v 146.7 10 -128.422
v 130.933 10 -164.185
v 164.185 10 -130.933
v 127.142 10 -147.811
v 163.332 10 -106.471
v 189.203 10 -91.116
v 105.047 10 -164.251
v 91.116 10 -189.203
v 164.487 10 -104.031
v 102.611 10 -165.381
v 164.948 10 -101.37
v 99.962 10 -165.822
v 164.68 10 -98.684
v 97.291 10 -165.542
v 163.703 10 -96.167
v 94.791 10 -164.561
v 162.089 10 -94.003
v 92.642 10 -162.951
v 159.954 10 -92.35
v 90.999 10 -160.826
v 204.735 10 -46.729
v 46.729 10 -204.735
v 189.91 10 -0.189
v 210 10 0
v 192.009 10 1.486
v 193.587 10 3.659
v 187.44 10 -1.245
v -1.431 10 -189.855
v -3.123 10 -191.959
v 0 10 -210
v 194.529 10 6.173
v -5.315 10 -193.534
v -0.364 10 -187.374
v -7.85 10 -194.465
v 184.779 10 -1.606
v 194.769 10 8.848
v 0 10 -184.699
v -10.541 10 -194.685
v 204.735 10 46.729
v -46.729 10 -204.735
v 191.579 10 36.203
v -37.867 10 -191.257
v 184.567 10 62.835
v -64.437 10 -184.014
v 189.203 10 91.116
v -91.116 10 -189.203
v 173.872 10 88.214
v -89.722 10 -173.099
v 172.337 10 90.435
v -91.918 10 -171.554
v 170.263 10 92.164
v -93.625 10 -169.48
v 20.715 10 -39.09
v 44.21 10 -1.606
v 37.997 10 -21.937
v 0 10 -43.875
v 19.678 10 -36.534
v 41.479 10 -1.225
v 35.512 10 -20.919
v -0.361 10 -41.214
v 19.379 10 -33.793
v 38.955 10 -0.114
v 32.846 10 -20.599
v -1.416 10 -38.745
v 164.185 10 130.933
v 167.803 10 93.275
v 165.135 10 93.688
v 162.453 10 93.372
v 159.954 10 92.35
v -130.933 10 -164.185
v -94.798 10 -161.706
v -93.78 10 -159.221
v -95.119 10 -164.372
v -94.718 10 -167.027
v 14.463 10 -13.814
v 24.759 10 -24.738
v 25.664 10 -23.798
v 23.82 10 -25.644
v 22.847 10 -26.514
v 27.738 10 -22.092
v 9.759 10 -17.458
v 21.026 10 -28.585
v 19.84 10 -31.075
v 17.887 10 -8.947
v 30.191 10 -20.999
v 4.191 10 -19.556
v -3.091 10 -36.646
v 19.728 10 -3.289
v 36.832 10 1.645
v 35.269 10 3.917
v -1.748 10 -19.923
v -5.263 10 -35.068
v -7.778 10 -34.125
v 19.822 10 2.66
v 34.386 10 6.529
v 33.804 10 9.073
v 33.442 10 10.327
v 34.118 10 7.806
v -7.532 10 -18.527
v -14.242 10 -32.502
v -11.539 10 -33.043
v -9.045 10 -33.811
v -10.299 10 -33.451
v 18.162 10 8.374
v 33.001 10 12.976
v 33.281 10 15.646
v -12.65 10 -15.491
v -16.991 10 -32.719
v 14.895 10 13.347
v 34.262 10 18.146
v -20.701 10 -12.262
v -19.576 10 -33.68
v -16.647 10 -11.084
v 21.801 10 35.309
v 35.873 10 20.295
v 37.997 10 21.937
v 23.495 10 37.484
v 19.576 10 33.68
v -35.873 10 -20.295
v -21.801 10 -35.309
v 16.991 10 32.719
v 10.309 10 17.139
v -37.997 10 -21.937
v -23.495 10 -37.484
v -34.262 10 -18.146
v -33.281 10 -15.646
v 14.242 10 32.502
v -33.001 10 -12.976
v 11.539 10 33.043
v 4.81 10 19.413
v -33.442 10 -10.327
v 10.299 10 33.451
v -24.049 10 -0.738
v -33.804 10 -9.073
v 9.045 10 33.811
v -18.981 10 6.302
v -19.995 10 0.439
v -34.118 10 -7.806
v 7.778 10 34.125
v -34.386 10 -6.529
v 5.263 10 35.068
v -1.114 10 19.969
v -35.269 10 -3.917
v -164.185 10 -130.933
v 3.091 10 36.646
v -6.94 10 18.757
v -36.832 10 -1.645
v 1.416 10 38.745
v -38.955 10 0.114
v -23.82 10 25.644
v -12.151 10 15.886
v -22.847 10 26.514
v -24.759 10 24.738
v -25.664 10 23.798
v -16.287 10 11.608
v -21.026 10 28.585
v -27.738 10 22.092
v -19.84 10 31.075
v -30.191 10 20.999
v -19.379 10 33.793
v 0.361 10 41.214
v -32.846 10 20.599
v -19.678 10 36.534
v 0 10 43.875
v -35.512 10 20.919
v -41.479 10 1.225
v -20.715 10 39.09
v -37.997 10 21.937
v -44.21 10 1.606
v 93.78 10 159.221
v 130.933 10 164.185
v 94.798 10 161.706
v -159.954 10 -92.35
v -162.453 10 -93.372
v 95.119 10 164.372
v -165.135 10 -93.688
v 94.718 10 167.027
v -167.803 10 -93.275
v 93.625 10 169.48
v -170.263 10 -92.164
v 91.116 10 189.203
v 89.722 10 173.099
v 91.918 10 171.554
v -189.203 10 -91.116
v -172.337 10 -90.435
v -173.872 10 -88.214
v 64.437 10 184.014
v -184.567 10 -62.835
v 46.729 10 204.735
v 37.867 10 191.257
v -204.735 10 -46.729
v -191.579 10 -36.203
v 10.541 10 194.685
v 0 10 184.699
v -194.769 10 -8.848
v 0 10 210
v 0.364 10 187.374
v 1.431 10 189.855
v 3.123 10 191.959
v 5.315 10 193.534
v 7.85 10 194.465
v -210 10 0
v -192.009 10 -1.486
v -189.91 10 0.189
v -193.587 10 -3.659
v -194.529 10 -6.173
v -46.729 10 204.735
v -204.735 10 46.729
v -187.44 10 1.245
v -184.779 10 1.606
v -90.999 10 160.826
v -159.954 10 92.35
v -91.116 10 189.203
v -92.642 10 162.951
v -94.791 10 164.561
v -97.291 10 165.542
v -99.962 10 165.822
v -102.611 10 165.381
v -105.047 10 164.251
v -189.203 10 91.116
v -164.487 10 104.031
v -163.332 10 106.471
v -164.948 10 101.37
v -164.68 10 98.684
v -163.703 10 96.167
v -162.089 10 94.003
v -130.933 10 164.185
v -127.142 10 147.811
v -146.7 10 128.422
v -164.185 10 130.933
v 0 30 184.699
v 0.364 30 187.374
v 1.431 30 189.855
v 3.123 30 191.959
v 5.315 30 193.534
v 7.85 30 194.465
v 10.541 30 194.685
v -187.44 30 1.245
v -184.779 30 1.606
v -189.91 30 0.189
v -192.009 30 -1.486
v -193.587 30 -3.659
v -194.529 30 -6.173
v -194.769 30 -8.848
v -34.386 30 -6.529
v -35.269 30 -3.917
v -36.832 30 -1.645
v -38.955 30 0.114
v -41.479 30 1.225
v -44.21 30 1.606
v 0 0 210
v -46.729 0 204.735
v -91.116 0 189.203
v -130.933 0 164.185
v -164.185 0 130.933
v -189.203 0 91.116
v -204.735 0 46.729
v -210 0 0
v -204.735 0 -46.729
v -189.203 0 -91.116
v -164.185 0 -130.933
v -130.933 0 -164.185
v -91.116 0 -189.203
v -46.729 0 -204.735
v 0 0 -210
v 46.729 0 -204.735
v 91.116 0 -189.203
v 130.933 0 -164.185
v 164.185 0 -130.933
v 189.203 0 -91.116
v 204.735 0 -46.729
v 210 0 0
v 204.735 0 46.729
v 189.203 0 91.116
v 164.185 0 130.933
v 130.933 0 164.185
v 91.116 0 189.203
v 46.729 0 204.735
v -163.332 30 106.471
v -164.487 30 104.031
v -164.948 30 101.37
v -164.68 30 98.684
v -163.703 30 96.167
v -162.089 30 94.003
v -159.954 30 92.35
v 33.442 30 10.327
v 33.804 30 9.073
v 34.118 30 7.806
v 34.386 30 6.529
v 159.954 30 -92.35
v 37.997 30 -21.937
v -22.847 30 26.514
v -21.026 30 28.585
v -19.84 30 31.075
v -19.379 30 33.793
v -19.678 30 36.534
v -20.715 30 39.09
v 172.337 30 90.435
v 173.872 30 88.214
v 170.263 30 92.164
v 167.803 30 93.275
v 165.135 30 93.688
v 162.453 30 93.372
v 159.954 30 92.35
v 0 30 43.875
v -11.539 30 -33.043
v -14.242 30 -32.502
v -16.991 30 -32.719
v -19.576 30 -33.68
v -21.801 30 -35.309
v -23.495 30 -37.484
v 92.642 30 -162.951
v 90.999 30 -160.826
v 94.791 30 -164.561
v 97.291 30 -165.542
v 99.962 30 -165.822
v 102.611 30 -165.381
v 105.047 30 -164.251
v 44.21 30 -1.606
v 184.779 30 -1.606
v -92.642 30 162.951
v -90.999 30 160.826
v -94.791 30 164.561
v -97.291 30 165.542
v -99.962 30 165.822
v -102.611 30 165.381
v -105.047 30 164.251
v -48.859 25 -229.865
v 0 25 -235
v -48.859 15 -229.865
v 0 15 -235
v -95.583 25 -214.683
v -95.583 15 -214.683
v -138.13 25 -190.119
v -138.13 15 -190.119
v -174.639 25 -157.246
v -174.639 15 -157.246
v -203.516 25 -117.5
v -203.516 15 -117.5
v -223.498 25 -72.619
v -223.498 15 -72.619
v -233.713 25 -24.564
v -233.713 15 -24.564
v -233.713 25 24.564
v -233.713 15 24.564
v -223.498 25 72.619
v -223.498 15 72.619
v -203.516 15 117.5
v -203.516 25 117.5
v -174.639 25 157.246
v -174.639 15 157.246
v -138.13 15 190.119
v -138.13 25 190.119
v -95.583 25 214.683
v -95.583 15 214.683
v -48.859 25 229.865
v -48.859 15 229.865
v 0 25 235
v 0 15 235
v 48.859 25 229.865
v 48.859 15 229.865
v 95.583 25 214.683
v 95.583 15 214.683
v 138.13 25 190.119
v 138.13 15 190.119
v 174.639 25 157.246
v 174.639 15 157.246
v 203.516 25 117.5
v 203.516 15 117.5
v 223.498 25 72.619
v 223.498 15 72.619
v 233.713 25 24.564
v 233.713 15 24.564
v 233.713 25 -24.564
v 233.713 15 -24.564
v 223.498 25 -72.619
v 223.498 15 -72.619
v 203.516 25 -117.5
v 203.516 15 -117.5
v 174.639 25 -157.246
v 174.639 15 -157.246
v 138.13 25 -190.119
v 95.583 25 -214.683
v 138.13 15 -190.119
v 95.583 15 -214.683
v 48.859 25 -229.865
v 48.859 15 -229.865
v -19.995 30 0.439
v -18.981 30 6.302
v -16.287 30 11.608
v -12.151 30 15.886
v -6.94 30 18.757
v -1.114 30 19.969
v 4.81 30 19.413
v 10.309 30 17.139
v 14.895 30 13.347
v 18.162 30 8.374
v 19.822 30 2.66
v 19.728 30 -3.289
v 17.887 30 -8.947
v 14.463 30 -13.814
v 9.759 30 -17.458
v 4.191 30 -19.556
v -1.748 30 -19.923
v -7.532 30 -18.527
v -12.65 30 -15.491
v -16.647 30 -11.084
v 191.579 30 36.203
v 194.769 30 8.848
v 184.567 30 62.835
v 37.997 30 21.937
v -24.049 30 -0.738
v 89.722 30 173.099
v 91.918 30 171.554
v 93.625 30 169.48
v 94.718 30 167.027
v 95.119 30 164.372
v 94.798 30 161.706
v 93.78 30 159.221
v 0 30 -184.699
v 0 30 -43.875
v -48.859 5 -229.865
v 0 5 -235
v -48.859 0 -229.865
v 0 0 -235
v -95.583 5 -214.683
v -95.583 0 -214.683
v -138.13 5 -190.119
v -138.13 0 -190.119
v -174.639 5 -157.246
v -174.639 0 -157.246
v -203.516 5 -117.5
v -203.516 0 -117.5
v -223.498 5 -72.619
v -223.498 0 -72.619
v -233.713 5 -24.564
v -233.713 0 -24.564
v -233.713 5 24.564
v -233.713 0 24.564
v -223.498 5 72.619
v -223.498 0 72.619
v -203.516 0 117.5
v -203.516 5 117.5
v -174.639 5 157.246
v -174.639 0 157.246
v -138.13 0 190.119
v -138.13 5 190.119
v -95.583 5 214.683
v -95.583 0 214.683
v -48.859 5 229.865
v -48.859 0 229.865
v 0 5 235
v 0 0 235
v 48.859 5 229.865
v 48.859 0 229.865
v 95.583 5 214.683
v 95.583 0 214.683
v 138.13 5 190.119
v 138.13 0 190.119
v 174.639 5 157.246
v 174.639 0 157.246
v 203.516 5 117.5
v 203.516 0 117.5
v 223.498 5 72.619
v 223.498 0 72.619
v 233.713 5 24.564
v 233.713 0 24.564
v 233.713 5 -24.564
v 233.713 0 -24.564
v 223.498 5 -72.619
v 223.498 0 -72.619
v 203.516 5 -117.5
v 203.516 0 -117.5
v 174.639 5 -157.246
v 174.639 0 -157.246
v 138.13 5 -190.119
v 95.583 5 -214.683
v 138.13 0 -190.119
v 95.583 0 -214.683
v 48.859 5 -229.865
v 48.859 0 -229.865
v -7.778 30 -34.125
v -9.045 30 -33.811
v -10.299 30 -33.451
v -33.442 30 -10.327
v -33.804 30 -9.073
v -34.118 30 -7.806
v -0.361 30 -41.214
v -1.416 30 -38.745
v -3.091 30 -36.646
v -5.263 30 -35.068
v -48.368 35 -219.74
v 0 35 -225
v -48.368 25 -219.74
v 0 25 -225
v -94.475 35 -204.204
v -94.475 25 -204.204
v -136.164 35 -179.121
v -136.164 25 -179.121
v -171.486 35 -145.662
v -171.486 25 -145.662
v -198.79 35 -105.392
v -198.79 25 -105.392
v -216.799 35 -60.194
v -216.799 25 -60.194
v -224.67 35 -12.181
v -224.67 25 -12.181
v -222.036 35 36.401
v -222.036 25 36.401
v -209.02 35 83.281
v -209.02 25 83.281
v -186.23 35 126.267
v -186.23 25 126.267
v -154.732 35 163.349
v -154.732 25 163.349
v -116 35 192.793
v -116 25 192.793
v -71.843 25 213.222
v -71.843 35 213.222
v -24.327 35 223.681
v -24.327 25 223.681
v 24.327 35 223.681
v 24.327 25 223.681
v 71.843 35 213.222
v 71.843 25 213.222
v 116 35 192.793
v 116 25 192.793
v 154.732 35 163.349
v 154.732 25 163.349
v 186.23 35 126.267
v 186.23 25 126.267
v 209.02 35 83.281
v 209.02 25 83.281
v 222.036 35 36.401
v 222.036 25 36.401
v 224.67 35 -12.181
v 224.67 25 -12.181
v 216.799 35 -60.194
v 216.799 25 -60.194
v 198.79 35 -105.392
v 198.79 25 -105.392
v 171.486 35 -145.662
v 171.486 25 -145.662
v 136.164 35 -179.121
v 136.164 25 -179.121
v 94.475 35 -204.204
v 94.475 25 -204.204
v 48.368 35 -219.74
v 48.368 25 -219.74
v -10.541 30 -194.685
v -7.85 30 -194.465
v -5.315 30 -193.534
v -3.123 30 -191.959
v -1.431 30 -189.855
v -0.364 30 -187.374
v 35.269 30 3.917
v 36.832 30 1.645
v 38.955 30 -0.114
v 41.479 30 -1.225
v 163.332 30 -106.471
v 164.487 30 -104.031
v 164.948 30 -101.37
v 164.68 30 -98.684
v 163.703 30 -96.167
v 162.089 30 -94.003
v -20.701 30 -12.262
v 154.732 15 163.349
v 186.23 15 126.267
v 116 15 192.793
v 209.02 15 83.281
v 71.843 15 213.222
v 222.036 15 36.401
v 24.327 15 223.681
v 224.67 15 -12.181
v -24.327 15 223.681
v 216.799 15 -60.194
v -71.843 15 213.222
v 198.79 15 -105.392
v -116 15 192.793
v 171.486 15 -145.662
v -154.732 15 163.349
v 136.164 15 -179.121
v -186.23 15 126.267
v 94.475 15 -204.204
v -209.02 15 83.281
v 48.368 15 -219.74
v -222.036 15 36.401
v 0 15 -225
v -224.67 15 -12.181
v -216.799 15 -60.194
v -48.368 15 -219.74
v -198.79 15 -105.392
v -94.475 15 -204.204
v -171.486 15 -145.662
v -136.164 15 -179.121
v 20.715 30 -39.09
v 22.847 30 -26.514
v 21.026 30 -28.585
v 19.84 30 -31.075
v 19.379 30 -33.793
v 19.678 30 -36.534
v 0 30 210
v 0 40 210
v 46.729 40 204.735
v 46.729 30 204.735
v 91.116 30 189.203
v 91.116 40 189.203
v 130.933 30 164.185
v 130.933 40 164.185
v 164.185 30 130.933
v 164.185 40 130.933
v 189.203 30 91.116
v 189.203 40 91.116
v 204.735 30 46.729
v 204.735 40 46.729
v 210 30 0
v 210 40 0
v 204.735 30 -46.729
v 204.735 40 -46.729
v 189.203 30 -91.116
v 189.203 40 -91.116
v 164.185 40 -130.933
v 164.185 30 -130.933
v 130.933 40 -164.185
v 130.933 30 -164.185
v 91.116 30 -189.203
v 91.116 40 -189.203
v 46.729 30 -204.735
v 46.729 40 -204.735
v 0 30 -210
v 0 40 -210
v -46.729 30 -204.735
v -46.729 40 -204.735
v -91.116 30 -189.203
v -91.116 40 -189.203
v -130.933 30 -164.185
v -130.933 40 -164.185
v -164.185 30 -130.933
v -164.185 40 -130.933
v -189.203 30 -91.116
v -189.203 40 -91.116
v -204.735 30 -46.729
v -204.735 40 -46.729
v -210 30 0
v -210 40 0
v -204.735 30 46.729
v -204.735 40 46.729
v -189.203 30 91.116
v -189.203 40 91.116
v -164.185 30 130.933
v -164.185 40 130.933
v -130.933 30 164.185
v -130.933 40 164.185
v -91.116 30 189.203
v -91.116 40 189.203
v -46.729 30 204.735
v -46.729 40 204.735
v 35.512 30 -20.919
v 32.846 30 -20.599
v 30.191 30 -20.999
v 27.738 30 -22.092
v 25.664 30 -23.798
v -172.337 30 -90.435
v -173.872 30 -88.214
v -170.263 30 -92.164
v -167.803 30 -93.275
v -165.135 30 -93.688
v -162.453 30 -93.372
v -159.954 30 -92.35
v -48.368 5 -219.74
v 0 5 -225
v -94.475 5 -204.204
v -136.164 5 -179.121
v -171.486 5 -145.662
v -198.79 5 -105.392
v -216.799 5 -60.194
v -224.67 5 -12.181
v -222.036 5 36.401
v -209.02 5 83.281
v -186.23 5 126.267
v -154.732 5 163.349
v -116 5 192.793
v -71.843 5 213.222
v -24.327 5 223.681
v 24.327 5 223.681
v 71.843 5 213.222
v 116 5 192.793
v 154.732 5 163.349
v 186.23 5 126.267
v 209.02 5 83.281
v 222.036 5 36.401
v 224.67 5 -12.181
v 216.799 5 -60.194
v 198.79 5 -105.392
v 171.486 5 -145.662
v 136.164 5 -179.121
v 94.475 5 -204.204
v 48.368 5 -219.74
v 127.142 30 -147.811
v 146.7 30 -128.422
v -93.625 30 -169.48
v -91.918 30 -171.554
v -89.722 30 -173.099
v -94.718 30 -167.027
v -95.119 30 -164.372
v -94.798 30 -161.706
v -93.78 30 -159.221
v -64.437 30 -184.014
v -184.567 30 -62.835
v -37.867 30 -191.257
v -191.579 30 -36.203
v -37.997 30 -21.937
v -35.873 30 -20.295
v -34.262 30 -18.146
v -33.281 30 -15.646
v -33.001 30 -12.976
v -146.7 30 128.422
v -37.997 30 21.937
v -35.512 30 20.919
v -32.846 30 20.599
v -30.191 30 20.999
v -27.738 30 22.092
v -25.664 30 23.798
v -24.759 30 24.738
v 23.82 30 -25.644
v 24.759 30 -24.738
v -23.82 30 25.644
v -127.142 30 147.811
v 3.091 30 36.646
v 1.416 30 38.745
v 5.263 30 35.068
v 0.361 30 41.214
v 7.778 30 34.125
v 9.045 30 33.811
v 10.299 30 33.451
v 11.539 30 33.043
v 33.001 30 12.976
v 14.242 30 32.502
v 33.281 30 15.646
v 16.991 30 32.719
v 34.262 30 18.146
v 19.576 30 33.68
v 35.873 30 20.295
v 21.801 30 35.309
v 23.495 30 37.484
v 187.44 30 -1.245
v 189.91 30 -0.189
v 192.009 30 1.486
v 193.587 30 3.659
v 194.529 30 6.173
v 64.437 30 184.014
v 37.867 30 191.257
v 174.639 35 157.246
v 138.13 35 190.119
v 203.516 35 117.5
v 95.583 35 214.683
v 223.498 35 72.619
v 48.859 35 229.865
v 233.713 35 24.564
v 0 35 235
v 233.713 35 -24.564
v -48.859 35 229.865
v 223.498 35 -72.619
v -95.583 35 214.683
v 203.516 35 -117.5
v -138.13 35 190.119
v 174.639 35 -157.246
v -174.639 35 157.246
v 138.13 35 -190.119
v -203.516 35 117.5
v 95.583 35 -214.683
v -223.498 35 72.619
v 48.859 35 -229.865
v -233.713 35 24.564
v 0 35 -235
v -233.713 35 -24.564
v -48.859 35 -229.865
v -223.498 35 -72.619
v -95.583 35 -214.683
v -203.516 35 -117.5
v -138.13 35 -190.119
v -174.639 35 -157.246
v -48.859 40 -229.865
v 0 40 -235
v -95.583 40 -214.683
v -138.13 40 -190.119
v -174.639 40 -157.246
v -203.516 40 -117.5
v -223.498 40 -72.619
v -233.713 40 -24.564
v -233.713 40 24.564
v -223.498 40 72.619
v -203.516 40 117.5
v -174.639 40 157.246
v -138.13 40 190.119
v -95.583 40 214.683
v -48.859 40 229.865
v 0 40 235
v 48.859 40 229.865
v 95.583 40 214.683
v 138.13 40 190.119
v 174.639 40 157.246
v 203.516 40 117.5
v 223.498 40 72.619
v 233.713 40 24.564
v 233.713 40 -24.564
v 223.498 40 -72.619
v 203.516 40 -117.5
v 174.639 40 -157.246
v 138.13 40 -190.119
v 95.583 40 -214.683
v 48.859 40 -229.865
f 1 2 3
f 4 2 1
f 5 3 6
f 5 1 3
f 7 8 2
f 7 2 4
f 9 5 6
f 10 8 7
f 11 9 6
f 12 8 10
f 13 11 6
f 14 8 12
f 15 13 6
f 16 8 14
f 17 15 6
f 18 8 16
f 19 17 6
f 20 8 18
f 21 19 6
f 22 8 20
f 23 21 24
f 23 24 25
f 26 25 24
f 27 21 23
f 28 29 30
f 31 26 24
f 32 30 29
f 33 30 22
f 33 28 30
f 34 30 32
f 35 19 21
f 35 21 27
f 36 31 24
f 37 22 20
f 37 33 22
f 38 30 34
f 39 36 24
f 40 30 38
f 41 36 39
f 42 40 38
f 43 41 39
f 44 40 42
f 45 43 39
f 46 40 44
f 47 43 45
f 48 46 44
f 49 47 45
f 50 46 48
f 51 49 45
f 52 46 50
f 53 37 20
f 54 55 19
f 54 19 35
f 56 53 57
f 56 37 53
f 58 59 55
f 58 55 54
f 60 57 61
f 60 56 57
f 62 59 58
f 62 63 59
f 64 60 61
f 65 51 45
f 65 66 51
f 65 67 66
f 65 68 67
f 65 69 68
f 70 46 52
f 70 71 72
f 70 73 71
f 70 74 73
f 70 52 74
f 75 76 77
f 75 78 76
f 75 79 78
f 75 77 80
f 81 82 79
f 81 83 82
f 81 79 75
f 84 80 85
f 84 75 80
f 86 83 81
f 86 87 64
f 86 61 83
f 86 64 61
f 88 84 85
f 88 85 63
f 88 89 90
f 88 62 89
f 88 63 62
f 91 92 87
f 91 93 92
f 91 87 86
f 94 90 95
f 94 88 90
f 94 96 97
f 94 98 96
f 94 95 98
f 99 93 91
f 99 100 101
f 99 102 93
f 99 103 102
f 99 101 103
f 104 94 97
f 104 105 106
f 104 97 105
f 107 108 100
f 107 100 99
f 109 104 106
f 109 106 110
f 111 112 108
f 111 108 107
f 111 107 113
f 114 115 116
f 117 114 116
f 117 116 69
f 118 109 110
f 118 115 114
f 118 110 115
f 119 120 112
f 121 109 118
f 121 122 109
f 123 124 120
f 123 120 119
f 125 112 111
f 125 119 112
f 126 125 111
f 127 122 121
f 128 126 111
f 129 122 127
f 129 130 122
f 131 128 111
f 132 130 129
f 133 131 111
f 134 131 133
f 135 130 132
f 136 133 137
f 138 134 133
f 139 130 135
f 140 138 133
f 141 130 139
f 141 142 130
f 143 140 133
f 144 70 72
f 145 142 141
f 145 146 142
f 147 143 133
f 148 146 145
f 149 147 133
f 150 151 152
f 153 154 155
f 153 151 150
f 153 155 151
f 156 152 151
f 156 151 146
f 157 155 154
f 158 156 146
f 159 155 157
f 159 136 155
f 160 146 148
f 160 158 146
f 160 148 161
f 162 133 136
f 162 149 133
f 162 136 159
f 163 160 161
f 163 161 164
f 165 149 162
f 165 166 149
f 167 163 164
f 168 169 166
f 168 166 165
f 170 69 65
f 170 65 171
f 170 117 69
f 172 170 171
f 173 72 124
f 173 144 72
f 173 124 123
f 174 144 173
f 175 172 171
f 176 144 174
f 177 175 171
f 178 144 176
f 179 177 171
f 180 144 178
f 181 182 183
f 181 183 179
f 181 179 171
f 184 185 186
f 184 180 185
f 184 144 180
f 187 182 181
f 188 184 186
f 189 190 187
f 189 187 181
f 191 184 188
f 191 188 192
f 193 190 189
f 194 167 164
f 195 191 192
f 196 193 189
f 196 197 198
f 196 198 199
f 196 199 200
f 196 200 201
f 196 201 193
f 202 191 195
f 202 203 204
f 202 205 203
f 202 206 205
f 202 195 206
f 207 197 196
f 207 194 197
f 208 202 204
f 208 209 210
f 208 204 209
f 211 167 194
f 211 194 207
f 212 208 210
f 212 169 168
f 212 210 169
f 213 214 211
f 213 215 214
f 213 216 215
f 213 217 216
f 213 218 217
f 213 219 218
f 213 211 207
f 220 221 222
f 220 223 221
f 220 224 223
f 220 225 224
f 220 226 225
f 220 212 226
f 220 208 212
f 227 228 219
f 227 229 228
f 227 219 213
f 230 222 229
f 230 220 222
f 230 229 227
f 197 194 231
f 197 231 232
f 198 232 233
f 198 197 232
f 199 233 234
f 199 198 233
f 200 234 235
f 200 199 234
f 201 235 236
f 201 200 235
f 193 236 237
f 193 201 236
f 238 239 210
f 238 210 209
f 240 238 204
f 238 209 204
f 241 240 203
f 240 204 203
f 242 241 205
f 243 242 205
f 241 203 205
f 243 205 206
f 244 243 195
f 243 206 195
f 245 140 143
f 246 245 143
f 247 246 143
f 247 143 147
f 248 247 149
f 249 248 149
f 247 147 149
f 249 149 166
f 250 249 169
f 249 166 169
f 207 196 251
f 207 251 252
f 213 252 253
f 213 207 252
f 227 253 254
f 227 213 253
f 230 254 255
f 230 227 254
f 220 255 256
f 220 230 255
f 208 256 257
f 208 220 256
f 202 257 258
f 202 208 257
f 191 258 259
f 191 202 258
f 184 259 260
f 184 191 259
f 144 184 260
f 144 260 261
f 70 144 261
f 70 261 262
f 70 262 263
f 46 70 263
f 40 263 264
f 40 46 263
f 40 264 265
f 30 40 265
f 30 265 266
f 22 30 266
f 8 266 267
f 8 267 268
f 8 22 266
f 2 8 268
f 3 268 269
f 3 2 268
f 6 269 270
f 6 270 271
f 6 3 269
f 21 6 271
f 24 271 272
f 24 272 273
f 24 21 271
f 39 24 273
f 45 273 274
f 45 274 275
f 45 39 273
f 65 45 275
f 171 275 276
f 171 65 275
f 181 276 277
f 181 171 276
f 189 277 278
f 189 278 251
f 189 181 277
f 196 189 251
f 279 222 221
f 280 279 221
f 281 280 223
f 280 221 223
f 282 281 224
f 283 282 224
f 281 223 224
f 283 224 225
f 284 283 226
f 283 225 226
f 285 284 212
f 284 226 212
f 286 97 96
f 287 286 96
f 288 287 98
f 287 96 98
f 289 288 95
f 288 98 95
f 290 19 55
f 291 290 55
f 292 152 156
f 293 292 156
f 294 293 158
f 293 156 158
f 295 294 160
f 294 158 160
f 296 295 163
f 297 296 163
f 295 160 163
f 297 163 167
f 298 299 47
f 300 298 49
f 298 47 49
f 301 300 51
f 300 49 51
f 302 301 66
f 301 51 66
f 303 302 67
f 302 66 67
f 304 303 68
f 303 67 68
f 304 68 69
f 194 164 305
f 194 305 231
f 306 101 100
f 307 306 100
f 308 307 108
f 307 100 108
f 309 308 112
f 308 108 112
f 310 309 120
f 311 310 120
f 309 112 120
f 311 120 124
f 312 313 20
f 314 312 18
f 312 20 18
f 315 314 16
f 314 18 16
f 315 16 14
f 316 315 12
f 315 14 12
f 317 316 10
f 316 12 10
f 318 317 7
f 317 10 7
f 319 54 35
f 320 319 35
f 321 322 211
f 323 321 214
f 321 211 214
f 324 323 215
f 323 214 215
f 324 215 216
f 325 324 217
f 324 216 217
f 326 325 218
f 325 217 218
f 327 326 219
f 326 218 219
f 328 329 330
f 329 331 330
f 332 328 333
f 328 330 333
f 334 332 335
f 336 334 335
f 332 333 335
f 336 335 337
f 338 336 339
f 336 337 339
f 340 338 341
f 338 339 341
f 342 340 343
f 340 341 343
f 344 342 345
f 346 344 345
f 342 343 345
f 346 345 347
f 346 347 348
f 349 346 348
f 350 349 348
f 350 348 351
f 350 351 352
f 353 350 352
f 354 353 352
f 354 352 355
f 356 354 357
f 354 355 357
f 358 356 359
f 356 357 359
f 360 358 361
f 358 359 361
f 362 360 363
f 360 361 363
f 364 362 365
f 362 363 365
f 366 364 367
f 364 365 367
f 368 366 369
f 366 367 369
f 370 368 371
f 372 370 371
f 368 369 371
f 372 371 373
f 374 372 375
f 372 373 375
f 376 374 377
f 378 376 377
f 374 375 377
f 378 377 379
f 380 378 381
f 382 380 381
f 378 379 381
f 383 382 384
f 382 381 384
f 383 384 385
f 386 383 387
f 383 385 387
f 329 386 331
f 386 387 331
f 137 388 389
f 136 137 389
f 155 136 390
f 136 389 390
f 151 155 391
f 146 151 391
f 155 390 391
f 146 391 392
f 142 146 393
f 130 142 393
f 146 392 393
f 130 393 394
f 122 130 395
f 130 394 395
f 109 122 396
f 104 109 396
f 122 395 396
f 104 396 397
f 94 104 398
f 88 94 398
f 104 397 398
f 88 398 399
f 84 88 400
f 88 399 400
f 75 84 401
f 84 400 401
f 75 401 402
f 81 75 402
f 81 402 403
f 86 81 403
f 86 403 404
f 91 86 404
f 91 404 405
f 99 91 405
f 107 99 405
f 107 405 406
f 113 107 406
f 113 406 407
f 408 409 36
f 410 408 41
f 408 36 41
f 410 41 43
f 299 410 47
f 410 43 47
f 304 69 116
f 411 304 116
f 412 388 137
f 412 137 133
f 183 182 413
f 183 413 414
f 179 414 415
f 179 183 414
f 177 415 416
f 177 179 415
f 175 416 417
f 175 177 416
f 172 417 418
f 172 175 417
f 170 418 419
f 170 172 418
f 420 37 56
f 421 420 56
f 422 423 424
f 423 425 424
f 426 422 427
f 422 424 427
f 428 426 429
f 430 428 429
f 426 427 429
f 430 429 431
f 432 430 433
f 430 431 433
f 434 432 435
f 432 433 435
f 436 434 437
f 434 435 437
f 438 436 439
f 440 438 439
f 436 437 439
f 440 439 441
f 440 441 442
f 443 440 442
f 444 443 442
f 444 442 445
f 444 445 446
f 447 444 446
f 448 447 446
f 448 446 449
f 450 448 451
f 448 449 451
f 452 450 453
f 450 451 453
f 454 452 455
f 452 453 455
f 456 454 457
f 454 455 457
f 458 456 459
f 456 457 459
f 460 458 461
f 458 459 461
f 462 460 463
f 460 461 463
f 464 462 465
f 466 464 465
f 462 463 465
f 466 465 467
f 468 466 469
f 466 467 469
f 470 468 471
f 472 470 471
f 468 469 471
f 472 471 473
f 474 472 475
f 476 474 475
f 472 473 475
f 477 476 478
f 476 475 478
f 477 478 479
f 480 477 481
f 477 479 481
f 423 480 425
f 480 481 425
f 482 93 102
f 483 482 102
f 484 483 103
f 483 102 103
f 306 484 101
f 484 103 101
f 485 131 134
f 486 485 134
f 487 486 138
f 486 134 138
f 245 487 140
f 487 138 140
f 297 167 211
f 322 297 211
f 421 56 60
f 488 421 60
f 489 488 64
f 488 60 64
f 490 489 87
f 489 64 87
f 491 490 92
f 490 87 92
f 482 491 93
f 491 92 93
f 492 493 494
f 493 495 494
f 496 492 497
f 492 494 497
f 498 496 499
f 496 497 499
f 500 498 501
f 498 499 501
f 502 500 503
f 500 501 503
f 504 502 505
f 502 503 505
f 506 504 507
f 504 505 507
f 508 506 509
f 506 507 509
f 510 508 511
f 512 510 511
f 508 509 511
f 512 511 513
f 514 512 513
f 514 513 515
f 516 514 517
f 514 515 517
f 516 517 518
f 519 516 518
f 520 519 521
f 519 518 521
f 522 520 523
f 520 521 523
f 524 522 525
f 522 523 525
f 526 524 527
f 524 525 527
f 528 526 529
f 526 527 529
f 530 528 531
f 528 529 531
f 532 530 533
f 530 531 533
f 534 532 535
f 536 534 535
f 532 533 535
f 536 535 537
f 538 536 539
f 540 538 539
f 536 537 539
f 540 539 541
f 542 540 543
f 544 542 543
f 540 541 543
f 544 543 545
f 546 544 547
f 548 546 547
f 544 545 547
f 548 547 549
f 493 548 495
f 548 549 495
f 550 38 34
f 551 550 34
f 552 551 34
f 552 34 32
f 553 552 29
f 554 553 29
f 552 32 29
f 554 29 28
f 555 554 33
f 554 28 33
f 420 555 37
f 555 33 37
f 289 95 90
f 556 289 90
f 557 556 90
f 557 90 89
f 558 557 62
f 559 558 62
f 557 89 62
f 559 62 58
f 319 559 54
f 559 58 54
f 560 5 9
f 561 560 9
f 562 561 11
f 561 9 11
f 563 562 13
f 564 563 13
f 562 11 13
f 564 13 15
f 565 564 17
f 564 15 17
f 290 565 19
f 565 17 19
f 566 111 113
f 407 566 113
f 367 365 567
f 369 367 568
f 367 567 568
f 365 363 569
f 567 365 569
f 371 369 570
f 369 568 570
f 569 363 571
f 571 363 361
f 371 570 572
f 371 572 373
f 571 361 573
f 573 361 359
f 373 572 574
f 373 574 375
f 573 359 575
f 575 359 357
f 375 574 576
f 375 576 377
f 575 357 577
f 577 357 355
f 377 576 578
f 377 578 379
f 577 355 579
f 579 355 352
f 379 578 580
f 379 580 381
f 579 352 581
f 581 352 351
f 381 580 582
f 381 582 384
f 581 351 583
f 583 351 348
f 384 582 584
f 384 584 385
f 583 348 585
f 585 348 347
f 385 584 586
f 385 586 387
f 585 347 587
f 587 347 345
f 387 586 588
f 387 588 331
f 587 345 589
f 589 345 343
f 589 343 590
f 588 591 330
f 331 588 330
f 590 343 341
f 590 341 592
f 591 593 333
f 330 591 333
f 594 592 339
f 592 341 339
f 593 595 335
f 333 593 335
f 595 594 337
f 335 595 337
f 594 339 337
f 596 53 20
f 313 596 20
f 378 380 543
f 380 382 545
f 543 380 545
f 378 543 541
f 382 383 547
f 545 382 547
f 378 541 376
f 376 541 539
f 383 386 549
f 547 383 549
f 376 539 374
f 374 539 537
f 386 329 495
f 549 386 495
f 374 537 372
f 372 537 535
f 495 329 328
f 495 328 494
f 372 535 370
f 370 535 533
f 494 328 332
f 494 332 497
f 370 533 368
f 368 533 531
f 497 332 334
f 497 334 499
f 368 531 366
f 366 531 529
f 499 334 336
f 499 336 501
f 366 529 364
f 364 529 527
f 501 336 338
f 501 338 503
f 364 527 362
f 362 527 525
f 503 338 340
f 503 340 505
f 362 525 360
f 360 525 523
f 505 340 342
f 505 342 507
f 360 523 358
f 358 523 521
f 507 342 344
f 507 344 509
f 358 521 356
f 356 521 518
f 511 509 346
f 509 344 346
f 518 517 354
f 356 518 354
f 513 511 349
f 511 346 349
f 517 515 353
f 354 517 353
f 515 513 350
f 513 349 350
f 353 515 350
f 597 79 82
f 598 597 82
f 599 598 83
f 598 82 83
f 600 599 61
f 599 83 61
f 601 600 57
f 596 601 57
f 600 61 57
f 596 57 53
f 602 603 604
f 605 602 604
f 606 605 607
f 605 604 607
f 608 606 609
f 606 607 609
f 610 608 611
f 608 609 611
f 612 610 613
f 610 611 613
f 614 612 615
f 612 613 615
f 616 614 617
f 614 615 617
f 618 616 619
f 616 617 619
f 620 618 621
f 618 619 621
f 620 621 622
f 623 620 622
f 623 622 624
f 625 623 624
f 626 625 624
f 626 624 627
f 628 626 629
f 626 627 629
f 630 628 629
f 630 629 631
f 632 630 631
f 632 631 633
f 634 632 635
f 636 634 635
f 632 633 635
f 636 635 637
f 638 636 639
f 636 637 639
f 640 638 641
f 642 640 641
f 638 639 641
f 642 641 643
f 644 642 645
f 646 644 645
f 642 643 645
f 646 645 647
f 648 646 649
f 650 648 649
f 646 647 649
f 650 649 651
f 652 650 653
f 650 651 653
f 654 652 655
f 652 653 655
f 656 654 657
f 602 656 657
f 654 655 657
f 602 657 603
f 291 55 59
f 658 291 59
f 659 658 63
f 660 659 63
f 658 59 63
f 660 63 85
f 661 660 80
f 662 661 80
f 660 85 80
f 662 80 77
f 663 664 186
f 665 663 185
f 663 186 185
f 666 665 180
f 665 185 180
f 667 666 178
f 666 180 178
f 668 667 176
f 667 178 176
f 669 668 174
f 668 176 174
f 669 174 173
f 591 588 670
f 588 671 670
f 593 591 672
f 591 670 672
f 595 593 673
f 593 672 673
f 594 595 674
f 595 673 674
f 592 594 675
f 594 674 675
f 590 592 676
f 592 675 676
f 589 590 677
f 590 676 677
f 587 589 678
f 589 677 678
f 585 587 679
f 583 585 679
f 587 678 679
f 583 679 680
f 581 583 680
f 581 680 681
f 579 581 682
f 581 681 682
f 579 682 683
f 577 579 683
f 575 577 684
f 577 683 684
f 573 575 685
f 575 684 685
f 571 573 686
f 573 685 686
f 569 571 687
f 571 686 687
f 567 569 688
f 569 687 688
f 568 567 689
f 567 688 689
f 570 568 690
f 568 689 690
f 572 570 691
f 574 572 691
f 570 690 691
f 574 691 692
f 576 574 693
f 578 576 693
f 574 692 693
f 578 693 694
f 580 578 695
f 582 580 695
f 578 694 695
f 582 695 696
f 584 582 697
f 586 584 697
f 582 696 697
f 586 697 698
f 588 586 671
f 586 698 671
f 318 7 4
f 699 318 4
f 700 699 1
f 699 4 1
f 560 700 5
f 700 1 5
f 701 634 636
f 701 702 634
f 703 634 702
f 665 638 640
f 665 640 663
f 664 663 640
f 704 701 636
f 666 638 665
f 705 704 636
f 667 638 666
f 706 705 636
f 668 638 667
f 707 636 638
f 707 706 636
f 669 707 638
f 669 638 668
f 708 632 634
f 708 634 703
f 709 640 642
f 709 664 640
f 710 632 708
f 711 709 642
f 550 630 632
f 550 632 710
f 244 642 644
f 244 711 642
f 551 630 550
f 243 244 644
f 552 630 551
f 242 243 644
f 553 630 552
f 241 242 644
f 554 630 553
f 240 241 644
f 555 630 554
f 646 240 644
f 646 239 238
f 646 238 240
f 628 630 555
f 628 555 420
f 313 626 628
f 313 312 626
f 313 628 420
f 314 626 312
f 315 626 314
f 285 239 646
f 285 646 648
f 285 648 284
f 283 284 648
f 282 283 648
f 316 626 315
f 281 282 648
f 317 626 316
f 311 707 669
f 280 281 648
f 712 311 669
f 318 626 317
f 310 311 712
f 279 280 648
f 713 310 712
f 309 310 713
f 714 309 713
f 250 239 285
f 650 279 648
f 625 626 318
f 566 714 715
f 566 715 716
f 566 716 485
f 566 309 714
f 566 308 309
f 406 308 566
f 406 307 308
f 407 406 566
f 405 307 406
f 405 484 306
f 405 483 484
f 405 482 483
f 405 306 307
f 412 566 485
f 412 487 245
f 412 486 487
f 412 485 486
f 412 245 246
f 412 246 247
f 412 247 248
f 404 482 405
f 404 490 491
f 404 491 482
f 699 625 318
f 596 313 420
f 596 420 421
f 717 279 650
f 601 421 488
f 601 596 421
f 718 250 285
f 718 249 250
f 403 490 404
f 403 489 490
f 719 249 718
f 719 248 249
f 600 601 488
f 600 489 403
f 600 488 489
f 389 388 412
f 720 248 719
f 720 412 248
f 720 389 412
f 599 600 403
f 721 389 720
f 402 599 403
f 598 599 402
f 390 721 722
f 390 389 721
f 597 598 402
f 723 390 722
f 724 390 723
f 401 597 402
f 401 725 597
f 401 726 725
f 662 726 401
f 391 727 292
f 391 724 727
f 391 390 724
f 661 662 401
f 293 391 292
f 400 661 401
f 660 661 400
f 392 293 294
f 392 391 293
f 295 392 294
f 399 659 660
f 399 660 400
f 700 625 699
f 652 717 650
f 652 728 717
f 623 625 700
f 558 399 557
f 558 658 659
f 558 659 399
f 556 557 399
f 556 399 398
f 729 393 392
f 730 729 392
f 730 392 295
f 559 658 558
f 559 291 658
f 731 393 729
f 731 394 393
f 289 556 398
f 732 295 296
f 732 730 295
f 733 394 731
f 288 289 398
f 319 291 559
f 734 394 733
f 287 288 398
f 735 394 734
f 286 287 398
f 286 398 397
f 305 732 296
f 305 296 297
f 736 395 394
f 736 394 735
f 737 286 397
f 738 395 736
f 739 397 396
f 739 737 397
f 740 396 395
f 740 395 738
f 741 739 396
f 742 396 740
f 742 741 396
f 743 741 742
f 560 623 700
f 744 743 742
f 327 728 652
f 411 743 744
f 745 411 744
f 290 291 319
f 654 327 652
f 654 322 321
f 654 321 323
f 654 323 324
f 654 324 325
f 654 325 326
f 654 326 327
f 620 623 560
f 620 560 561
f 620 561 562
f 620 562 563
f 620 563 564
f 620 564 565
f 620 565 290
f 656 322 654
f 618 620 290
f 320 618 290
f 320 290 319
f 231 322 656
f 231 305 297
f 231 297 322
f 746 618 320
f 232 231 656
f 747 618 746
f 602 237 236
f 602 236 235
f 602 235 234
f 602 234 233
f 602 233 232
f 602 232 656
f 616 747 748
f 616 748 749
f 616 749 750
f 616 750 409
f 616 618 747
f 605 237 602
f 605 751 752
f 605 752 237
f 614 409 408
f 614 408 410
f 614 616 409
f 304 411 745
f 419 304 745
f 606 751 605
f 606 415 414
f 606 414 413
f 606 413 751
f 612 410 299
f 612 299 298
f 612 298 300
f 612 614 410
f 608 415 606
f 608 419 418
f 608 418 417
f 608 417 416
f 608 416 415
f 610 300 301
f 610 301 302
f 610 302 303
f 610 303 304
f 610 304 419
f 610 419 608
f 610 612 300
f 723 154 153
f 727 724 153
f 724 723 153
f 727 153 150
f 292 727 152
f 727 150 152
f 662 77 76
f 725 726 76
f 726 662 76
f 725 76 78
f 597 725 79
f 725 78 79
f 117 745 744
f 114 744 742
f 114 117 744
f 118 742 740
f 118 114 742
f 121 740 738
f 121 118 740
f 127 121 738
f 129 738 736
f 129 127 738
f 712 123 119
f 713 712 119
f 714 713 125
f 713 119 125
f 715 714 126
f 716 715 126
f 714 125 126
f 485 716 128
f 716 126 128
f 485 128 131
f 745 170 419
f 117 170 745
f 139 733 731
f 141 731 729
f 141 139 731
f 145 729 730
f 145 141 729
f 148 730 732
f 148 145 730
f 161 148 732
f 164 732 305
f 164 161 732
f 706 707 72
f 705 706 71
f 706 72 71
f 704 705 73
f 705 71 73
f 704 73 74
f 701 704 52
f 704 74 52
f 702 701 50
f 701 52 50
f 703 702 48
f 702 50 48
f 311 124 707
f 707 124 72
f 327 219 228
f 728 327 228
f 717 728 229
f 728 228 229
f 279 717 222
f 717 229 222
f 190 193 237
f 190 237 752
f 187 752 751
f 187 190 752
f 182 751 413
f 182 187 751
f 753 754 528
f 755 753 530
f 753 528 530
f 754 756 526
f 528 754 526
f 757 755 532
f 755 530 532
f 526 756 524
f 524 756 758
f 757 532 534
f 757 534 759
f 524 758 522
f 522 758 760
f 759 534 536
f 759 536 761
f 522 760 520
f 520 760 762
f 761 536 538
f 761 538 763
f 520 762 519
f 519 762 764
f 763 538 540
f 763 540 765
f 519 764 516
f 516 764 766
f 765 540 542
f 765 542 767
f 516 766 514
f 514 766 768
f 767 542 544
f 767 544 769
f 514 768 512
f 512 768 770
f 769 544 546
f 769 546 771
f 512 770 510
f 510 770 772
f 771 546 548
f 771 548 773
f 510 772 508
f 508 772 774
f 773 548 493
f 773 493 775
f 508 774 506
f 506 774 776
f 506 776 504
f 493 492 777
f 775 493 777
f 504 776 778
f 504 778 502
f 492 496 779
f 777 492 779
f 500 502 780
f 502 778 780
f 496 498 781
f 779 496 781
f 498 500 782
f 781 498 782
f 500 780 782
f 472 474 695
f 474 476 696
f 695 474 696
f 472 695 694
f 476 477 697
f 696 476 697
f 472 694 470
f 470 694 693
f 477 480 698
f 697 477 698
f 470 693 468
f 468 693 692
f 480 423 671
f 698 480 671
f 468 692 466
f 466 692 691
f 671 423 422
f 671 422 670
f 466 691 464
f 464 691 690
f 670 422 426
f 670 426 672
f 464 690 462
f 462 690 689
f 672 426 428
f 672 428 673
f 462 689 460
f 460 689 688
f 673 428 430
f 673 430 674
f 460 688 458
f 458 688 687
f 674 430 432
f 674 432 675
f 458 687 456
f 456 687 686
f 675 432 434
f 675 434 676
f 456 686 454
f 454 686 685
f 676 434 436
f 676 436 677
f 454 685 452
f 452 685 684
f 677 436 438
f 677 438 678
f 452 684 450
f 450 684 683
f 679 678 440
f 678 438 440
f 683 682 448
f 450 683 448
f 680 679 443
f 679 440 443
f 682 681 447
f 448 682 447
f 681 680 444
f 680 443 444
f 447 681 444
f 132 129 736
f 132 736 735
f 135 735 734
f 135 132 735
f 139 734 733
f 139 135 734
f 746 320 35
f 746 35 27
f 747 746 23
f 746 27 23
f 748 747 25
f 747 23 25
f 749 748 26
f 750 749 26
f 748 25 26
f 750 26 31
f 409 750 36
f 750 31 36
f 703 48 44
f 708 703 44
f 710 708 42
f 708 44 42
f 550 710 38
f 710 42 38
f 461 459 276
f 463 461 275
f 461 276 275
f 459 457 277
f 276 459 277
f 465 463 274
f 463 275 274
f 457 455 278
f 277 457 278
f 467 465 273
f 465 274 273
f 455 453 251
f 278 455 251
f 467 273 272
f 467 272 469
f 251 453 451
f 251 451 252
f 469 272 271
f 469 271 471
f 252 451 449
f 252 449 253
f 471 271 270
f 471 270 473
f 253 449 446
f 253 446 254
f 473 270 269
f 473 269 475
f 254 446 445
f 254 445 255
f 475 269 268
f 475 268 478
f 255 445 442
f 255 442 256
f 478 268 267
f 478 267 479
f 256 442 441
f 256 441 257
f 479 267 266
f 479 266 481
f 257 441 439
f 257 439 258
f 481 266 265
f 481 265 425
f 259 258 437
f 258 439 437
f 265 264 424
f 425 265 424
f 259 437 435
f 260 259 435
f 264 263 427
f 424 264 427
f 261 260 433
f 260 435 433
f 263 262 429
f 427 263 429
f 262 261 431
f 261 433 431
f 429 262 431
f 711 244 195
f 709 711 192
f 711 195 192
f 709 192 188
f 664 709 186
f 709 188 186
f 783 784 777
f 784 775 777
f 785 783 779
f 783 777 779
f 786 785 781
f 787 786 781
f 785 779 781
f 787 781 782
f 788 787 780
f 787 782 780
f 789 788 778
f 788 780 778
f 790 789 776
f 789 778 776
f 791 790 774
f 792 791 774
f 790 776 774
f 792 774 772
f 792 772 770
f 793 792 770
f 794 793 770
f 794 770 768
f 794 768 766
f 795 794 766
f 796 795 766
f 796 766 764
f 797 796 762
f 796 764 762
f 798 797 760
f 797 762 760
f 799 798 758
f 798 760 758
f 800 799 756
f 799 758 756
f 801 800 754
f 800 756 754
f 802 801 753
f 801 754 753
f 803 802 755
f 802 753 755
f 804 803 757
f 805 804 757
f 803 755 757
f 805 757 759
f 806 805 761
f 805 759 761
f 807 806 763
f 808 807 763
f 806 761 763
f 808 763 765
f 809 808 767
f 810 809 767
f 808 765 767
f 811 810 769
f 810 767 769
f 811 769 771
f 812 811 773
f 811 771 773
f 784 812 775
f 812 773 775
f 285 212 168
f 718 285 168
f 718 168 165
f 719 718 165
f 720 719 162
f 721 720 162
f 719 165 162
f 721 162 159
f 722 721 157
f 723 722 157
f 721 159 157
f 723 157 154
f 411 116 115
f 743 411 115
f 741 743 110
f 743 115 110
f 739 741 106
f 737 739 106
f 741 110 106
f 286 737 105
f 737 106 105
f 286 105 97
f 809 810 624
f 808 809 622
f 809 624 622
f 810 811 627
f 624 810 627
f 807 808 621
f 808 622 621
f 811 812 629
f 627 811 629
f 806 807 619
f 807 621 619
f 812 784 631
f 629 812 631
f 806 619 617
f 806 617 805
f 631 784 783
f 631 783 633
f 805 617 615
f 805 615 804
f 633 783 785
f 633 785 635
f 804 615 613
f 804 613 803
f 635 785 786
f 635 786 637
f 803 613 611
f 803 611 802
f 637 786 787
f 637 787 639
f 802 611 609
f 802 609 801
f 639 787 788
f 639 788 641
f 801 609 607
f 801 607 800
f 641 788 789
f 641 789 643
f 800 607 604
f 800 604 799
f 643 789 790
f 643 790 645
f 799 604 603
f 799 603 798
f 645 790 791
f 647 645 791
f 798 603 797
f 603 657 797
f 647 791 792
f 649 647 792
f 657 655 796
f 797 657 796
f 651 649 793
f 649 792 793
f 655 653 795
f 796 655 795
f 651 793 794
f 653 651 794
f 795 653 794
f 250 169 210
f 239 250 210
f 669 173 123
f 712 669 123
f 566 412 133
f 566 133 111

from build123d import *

# Parameters (mm, degrees)
CUT_EXTRUDE1_DEPTH = 335.738704066
SKETCH3_R          = 210
CUT_EXTRUDE2_DEPTH = 10
CUT_EXTRUDE3_START = -10
SKETCH4_R          = 210
CUT_EXTRUDE3_DEPTH = 10
CUT_EXTRUDE4_DEPTH = 334.691474269


with BuildPart() as part:
    # Sketch1 → Revolve1 (revolve)
    with BuildSketch(Plane(origin=(0, 0, 0), x_dir=(0, 0, -1), z_dir=(1, 0, 0))):
        Polygon((20, 0), (20, 40), (235, 40), (235, 35), (225, 35), (225, 25), (235, 25), (235, 15), (225, 15), (225, 5), (235, 5), (235, 0), align=None)
    revolve(axis=Axis((0, 0, 0), (0, 1, 0)))

    # Sketch2 → Cut-Extrude1 (cut, through all)
    with BuildSketch(Plane(origin=(0, 40, 0), x_dir=(1, 0, 0), z_dir=(0, 1, 0))):
        with BuildLine():
            Line((-19.995175711, -0.439258804), (-24.04880088, 0.738360519))
            Line((-24.04880088, 0.738360519), (-20.701084967, 12.261936274))
            Line((-20.701084967, 12.261936274), (-16.647459798, 11.084316951))
            ThreePointArc((-16.647459798, 11.084316951), (19.205959591, -5.579526521), (-19.995175711, -0.439258804))
        make_face()
    extrude(amount=-CUT_EXTRUDE1_DEPTH, mode=Mode.SUBTRACT)

    # Sketch3 → Cut-Extrude2 (cut)
    with BuildSketch(Plane(origin=(0, 40, 0), x_dir=(1, 0, 0), z_dir=(0, 1, 0))):
        with Locations(Location((0, 0, 0), (0, 0, 270))):
            Circle(SKETCH3_R)
    extrude(amount=-CUT_EXTRUDE2_DEPTH, mode=Mode.SUBTRACT)

    # Sketch4 → Cut-Extrude3 (cut)
    with BuildSketch(Plane.XZ.offset(CUT_EXTRUDE3_START)):
        with Locations(Location((0, 0, 0), (0, 0, 90))):
            Circle(SKETCH4_R)
    extrude(amount=CUT_EXTRUDE3_DEPTH, mode=Mode.SUBTRACT)

    # Sketch5 → Cut-Extrude4 (cut, through all)
    with BuildSketch(Plane.XZ.offset(-10)):
        with BuildLine():
            Line((0, 43.874821937), (0, 184.699253674))
            ThreePointArc((0, 184.699253674), (3.122729064, 191.958946813), (10.540628894, 194.684629))
            ThreePointArc((10.540628894, 194.684629), (51.279766456, 188.105276849), (89.721606346, 173.098939861))
            ThreePointArc((89.721606346, 173.098939861), (94.717809879, 167.027457013), (93.78003887, 159.220694609))
            Line((93.78003887, 159.220694609), (23.495497372, 37.484297749))
            ThreePointArc((23.495497372, 37.484297749), (18.316966013, 33.109992057), (11.538522594, 33.043342693))
            ThreePointArc((11.538522594, 33.043342693), (9.673276888, 33.636701893), (7.777777778, 34.124861507))
            ThreePointArc((7.777777778, 34.124861507), (2.1826404, 37.638726292), (0, 43.874821937))
        make_face()
        with BuildLine():
            Line((44.21010278, -1.605548725), (184.779185774, -1.605548725))
            ThreePointArc((184.779185774, -1.605548725), (192.008925843, 1.485698961), (194.768882461, 8.848279566))
            ThreePointArc((194.768882461, 8.848279566), (188.543831565, 49.643057974), (173.872148887, 88.213862106))
            ThreePointArc((173.872148887, 88.213862106), (167.802688955, 93.275110708), (159.954245742, 92.349626837))
            Line((159.954245742, 92.349626837), (37.996710384, 21.937410968))
            ThreePointArc((37.996710384, 21.937410968), (33.687413335, 16.929141112), (33.441885854, 10.326677613))
            ThreePointArc((33.441885854, 10.326677613), (33.966876783, 8.441047424), (34.385635495, 6.529017659))
            ThreePointArc((34.385635495, 6.529017659), (37.832577247, 0.692038141), (44.21010278, -1.605548725))
        make_face()
        with BuildLine():
            Line((20.714605407, -39.089846473), (90.999146905, -160.826243334))
            ThreePointArc((90.999146905, -160.826243334), (97.291115964, -165.541758053), (105.047276114, -164.250660295))
            ThreePointArc((105.047276114, -164.250660295), (137.264065109, -138.462218875), (163.331519993, -106.470766894))
            ThreePointArc((163.331519993, -106.470766894), (164.679959892, -98.683836105), (159.954245742, -92.349626837))
            Line((159.954245742, -92.349626837), (37.996710384, -21.937410968))
            ThreePointArc((37.996710384, -21.937410968), (31.504772935, -20.70958518), (25.664108076, -23.798183894))
            ThreePointArc((25.664108076, -23.798183894), (24.293599895, -25.195654469), (22.847112902, -26.514325035))
            ThreePointArc((22.847112902, -26.514325035), (19.515611235, -32.417953916), (20.714605407, -39.089846473))
        make_face()
        with BuildLine():
            Line((-23.495497372, -37.484297749), (-93.78003887, -159.220694609))
            ThreePointArc((-93.78003887, -159.220694609), (-94.717809879, -167.027457013), (-89.721606346, -173.098939861))
            ThreePointArc((-89.721606346, -173.098939861), (-51.279766456, -188.105276849), (-10.540628894, -194.684629))
            ThreePointArc((-10.540628894, -194.684629), (-3.122729064, -191.958946813), (0, -184.699253674))
            Line((0, -184.699253674), (0, -43.874821937))
            ThreePointArc((0, -43.874821937), (-2.1826404, -37.638726292), (-7.777777778, -34.124861507))
            ThreePointArc((-7.777777778, -34.124861507), (-9.673276888, -33.636701893), (-11.538522594, -33.043342693))
            ThreePointArc((-11.538522594, -33.043342693), (-18.316966013, -33.109992057), (-23.495497372, -37.484297749))
        make_face()
        with BuildLine():
            Line((-44.21010278, 1.605548725), (-184.779185774, 1.605548725))
            ThreePointArc((-184.779185774, 1.605548725), (-192.008925843, -1.485698961), (-194.768882461, -8.848279566))
            ThreePointArc((-194.768882461, -8.848279566), (-188.543831565, -49.643057974), (-173.872148887, -88.213862106))
            ThreePointArc((-173.872148887, -88.213862106), (-167.802688955, -93.275110708), (-159.954245742, -92.349626837))
            Line((-159.954245742, -92.349626837), (-37.996710384, -21.937410968))
            ThreePointArc((-37.996710384, -21.937410968), (-33.687413335, -16.929141112), (-33.441885854, -10.326677613))
            ThreePointArc((-33.441885854, -10.326677613), (-33.966876783, -8.441047424), (-34.385635495, -6.529017659))
            ThreePointArc((-34.385635495, -6.529017659), (-37.832577247, -0.692038141), (-44.21010278, 1.605548725))
        make_face()
        with BuildLine():
            Line((-20.714605407, 39.089846473), (-90.999146905, 160.826243334))
            ThreePointArc((-90.999146905, 160.826243334), (-97.291115964, 165.541758053), (-105.047276114, 164.250660295))
            ThreePointArc((-105.047276114, 164.250660295), (-137.264065109, 138.462218875), (-163.331519993, 106.470766894))
            ThreePointArc((-163.331519993, 106.470766894), (-164.679959892, 98.683836105), (-159.954245742, 92.349626837))
            Line((-159.954245742, 92.349626837), (-37.996710384, 21.937410968))
            ThreePointArc((-37.996710384, 21.937410968), (-31.504772935, 20.70958518), (-25.664108076, 23.798183894))
            ThreePointArc((-25.664108076, 23.798183894), (-24.293599895, 25.195654469), (-22.847112902, 26.514325035))
            ThreePointArc((-22.847112902, 26.514325035), (-19.515611235, 32.417953916), (-20.714605407, 39.089846473))
        make_face()
    extrude(amount=-CUT_EXTRUDE4_DEPTH, mode=Mode.SUBTRACT)


solid = part.part
